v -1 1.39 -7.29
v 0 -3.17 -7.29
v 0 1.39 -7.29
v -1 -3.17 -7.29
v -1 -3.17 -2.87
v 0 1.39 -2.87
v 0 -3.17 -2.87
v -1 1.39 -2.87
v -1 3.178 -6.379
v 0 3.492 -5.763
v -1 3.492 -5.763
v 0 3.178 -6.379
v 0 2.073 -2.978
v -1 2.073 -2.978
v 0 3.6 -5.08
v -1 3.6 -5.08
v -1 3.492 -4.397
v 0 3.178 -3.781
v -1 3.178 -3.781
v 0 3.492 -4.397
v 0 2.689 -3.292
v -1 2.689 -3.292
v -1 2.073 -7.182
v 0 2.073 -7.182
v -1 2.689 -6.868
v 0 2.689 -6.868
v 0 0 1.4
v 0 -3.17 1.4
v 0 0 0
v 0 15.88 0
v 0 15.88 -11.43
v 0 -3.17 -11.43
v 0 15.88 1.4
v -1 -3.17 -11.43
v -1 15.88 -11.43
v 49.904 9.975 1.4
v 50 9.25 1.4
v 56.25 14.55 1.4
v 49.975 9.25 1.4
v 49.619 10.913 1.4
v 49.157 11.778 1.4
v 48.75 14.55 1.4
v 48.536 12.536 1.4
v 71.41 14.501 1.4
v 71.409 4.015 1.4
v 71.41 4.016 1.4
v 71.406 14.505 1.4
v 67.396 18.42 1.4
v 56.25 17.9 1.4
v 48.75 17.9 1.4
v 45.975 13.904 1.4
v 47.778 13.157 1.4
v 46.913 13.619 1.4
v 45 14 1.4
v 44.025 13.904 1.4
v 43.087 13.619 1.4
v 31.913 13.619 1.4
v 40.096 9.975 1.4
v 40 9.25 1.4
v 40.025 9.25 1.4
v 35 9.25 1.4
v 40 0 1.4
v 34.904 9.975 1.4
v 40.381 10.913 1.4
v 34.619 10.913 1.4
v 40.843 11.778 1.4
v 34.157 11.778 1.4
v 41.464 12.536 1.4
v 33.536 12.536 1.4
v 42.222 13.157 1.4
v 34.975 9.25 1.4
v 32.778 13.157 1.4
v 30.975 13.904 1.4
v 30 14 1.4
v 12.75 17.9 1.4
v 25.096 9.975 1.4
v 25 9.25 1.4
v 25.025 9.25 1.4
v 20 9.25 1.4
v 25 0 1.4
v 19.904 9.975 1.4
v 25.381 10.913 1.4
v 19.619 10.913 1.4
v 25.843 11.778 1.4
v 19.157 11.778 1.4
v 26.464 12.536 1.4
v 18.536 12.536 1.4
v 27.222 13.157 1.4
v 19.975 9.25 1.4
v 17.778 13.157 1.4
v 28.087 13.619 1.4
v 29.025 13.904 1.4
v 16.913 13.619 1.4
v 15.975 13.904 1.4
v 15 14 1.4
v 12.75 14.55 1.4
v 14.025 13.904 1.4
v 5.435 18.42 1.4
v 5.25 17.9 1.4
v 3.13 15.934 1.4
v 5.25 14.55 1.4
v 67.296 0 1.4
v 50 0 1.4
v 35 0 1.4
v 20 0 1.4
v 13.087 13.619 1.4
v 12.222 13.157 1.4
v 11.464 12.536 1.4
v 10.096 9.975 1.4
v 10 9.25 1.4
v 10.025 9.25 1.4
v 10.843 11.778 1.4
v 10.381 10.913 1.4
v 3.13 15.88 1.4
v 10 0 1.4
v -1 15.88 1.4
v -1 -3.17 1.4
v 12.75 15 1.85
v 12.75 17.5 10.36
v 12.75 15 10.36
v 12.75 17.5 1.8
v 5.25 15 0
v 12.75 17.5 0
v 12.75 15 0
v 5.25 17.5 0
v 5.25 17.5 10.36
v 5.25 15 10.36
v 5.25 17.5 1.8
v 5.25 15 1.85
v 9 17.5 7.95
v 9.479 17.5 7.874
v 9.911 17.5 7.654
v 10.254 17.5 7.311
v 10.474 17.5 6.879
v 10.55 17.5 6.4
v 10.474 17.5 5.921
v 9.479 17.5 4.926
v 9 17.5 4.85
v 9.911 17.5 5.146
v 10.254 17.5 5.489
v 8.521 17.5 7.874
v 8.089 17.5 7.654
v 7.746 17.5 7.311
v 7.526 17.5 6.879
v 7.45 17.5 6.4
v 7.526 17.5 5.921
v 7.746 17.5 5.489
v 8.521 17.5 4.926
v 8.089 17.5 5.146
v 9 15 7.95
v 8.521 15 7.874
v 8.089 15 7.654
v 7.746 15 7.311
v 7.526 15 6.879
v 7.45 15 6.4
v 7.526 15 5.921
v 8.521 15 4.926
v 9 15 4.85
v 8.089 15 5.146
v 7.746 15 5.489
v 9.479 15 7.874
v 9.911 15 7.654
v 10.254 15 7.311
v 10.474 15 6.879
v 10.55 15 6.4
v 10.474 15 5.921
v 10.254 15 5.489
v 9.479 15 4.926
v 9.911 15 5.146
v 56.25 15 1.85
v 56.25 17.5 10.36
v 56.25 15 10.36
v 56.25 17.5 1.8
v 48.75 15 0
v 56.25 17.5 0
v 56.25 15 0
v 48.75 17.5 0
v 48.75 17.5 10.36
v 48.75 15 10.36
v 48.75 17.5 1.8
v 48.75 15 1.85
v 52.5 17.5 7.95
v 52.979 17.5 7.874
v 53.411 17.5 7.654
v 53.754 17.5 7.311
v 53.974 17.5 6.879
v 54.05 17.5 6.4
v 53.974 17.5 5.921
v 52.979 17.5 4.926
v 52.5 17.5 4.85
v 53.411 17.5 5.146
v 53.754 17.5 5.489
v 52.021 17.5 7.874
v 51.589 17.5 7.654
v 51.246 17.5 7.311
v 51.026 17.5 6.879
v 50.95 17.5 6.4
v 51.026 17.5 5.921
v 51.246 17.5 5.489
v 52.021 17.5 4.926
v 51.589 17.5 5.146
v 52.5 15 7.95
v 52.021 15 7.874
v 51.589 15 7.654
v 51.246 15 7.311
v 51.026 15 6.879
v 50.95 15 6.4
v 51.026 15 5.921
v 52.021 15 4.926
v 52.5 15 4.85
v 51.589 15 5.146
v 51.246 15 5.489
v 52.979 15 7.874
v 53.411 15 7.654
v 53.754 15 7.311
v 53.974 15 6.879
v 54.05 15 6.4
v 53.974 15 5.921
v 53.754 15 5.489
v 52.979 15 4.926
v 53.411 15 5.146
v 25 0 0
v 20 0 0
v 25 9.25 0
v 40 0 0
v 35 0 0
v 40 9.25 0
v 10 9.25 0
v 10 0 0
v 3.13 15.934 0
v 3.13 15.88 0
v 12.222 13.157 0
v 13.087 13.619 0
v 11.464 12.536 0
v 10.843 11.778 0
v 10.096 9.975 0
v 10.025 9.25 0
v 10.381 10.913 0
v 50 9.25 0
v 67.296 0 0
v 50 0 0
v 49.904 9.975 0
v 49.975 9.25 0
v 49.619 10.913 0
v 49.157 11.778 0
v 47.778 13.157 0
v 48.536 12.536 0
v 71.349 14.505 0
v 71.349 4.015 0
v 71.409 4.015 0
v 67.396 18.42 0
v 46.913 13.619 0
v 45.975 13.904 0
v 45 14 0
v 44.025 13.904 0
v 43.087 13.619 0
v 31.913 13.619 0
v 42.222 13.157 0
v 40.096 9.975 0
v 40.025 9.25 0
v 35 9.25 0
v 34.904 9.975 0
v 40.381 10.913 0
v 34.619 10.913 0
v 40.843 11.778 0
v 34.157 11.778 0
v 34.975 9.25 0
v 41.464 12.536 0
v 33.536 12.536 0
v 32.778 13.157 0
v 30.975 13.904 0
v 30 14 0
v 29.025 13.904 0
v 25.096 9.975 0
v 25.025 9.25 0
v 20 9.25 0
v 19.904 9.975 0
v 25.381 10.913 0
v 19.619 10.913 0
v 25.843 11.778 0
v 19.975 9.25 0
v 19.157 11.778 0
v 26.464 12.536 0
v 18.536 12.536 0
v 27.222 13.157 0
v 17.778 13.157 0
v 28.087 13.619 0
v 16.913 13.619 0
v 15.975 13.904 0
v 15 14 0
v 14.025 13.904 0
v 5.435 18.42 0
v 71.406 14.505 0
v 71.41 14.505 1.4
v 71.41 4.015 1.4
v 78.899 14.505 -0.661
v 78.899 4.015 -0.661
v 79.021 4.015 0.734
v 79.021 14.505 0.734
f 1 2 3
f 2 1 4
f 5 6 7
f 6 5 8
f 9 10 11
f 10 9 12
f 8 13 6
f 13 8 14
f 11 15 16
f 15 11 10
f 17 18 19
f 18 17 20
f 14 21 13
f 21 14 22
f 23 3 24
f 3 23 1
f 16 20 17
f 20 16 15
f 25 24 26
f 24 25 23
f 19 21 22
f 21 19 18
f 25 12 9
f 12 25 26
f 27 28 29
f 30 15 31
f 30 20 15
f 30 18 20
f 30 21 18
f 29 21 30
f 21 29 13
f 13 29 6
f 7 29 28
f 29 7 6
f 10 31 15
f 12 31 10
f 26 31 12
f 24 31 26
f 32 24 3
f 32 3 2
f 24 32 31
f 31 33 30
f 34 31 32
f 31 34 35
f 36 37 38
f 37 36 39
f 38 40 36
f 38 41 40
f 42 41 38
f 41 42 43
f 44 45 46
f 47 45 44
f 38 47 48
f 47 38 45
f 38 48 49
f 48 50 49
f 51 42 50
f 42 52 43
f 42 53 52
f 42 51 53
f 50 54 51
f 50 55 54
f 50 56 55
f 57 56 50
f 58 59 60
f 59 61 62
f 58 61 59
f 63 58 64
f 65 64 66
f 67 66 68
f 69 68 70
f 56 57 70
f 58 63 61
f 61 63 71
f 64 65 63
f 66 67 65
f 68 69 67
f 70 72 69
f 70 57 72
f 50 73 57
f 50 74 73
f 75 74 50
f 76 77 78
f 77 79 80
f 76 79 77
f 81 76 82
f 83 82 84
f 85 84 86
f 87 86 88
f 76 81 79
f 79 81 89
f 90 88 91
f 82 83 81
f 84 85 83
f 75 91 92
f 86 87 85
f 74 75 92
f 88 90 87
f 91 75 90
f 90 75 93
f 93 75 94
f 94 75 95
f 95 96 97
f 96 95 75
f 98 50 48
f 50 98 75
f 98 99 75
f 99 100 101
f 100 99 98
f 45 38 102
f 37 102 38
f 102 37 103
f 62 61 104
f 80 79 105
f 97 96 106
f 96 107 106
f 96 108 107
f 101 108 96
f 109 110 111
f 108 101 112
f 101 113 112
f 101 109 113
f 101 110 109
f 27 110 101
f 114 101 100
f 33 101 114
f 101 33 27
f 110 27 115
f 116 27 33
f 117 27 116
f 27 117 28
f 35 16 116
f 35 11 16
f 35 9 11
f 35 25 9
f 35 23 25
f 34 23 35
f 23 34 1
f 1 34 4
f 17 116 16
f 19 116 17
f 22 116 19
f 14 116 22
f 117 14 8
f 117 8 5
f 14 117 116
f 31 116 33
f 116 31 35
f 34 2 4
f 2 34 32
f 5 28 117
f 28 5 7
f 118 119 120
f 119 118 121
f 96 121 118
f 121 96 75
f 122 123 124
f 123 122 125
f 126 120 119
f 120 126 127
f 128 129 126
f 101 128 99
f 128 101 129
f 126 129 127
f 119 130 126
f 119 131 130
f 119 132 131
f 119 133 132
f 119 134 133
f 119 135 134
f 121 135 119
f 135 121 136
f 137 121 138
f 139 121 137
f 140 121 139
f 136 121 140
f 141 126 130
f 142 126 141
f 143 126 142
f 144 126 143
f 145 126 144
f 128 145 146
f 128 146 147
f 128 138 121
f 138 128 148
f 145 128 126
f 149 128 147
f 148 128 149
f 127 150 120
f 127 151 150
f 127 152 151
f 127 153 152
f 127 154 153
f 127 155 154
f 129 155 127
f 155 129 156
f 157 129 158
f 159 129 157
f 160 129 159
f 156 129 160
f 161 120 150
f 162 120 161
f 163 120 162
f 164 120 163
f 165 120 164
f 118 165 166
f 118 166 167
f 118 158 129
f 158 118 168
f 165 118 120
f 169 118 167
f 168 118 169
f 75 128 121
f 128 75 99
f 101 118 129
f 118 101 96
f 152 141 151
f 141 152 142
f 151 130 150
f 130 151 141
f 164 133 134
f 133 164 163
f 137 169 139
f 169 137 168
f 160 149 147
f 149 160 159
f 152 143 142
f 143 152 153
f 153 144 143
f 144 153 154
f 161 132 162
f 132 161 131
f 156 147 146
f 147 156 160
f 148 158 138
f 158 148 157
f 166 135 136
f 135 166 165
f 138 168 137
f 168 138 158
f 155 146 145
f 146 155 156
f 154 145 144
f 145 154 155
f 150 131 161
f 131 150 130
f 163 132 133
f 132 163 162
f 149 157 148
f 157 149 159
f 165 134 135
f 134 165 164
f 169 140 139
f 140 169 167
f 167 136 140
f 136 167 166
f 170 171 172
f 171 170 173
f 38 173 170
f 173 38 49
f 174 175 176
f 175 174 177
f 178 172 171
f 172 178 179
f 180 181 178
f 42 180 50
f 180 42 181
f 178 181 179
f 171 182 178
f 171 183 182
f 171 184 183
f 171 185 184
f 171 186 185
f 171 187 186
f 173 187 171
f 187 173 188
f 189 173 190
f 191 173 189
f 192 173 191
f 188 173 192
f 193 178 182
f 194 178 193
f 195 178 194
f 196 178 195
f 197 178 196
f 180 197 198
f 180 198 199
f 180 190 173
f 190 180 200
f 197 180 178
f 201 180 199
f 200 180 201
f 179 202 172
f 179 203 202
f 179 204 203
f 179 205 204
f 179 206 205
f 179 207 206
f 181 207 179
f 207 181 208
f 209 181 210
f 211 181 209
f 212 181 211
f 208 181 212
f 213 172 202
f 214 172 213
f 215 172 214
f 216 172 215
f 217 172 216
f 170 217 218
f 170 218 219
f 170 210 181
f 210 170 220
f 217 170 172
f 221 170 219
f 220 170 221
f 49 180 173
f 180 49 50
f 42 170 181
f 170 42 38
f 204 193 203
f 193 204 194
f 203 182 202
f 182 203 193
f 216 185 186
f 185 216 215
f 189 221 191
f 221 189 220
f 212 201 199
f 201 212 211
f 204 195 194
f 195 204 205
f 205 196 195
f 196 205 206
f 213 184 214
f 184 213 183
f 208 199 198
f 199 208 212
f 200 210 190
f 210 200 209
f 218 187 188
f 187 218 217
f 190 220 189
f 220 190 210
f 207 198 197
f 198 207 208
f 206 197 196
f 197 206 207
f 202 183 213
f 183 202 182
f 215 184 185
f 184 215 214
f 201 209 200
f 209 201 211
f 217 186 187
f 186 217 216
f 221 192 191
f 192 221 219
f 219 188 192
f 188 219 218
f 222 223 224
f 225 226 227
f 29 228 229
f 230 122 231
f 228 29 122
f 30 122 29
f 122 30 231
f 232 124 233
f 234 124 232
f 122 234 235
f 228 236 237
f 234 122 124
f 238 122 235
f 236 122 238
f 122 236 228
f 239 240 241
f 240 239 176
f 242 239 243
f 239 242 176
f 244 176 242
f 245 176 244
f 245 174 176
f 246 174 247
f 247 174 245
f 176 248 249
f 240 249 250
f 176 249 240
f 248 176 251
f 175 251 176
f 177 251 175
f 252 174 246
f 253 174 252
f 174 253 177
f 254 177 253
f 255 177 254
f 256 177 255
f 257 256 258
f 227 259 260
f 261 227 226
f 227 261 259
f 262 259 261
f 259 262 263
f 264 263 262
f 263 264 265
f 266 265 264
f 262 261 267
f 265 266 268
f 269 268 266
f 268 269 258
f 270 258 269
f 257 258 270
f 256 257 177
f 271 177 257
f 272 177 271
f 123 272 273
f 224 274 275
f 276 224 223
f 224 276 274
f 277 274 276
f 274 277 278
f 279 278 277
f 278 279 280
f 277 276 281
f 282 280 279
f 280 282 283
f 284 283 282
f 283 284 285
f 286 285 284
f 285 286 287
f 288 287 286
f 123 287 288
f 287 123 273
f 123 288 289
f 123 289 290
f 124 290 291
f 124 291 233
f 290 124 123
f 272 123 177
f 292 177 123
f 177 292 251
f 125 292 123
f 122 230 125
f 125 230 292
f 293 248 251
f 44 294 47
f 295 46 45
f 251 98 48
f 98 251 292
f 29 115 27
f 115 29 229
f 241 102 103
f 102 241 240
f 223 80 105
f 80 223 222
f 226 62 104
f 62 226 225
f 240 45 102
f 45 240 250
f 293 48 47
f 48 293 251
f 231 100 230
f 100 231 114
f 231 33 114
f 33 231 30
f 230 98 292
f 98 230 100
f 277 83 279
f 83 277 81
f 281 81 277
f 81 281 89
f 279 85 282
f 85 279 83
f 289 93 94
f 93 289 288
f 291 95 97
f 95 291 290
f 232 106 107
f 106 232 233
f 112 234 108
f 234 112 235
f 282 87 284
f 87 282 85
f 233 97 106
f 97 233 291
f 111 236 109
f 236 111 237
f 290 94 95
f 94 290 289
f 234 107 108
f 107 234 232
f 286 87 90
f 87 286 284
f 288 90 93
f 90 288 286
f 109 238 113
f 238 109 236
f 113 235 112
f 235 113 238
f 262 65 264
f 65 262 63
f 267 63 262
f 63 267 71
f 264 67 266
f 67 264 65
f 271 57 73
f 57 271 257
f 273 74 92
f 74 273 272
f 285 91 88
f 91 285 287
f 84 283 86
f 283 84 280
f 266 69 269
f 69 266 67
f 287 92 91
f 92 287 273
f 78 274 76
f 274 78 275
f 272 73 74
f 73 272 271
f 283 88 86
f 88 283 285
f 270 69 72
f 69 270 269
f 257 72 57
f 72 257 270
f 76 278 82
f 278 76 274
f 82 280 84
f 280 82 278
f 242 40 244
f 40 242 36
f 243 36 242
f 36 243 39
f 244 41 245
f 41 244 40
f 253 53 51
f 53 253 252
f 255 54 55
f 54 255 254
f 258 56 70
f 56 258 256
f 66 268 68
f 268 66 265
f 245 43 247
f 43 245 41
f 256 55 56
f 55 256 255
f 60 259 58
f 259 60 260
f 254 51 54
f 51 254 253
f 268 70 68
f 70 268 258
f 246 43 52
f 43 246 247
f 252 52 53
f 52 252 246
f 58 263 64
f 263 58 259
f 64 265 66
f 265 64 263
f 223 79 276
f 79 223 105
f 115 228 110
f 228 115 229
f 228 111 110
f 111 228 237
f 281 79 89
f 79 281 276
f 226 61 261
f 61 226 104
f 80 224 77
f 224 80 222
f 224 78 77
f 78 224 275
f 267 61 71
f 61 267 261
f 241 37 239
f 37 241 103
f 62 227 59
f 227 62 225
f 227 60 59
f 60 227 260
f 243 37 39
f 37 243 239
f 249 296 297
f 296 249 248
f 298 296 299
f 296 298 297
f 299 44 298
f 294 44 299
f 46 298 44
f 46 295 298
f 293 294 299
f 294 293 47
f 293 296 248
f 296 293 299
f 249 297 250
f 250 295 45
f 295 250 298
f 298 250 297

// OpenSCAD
// mirror this

resolution=32; // $fn
low_profile=1; // [0:false, 1:true]
bracket_thickness = 1.4; // base bracket depth

angled_bottom_tab = 1; // [0:false, 1:true]
decorative_hole=0; // [0:false, 1:true]
isa_slot=0; // [0:false, 1:true]
pcb_thickness=1.6;
top_tab_thickness = 1;
/* [Screw mount tabs] */

first_screw_tab_enabled = 1; // [0:false, 1:true]
second_screw_tab_enabled = 1; // [0:false, 1:true]
screw_mounts_on_bottom_of_pcb = 0; // [0:false, 1:true]
screw_mount_width = 7.5;
screw_mount_depth = 2.5;
screw_mount_hole_r = 1.55; // m3 bolt
screw_mount_thread_distance_base = 5;
screw_mount_inset_r = 2.9; // m3 bolt head
screw_mount_inset_depth = 0;
screw_mount_caulking = 0.5;

first_mount_x = 9;
mount_hole_distance = 43.5;
// If on top of the PCB, it is recommended to have this be at least the thickness of the PCB
screw_mount_y = 15;
second_mount_x = first_mount_x + mount_hole_distance;

/* [Round Holes] */
hole_1_enabled = 1; // [0:false, 1:true]
// X is offset from the first screw hole (i.e. the screw hole closest to the case mount cutout)
hole_1_x = 15 - first_mount_x;
// Y is offset from top of pcb
hole_1_y = -6;
hole_1_d = 10;

hole_2_enabled = 1; // [0:false, 1:true]
hole_2_x = 30 - first_mount_x;
hole_2_y = hole_1_y;
hole_2_d = 10;

hole_3_enabled = 1; // [0:false, 1:true]
hole_3_x = 45 - first_mount_x;
hole_3_y = hole_1_y;
hole_3_d = 10;

hole_4_enabled = 0; // [0:false, 1:true]
hole_4_x = 76.12;
hole_4_y = 7;
hole_4_d = 6;

hole_5_enabled = 0; // [0:false, 1:true]
hole_5_x = 37.69;
hole_5_y = 6.5;
hole_5_d = 9.5;

hole_6_enabled = 0; // [0:false, 1:true]
hole_6_x = 51.04;
hole_6_y = 6.5;
hole_6_d = 9.5;

/* [Rectangular Holes] */
// hole is at center of x,y positions
rectangular_hole_1_enabled = 1; // [0:false, 1:true]
// X is offset from the first screw hole (i.e. the screw hole closest to the case mount cutout)
rectangular_hole_1_x = hole_1_x;
// Y is offset from top of pcb
rectangular_hole_1_y = -11;
rectangular_hole_1_w = 10.5;
rectangular_hole_1_h = 10.5;

rectangular_hole_2_enabled = 1; // [0:false, 1:true]
rectangular_hole_2_x = hole_2_x;
rectangular_hole_2_y = rectangular_hole_1_y;
rectangular_hole_2_w = 10.5;
rectangular_hole_2_h = 10.5;

rectangular_hole_3_enabled = 1; // [0:false, 1:true]
rectangular_hole_3_x = hole_3_x;
rectangular_hole_3_y = rectangular_hole_1_y;
rectangular_hole_3_w = 10.5;
rectangular_hole_3_h = 10.5;

rectangular_hole_4_enabled = 0; // [0:false, 1:true]
rectangular_hole_4_x = 76.12;
rectangular_hole_4_y = 7;
rectangular_hole_4_w = 10.5;
rectangular_hole_4_h = 10.5;

rectangular_hole_5_enabled = 0; // [0:false, 1:true]
rectangular_hole_5_x = 37.69;
rectangular_hole_5_y = 6.5;
rectangular_hole_5_w = 10.5;
rectangular_hole_5_h = 10.5;

rectangular_hole_6_enabled = 0; // [0:false, 1:true]
rectangular_hole_6_x = 51.04;
rectangular_hole_6_y = 6.5;
rectangular_hole_6_w = 10.5;
rectangular_hole_6_h = 10.5;
// values taken from https://content.norcomp.net/rohspdfs/Connectors/PanelCutOuts/Panel_Cutout_D-Sub-Single.pdf

/* [D-Sub holes (Serial/VGA/Gameport)] */
// hole is at center of x,y positions
dsub_hole_1_type = 0; // [0:None, 15.46:DB-9(VGA/Serial), 23.79:DB-15(Gameport), 37.51:DB-25(Parallel)]
// X is offset from the first screw hole (i.e. the screw hole closest to the case mount cutout)
dsub_hole_1_x = 37.6;
// Y is offset from top of pcb
dsub_hole_1_y = 7.1;
dsub_hole_1_invert = 0; // [0:false, 1:true]

dsub_hole_2_type = 0; // [0:None, 15.46:DB-9(VGA/Serial), 23.79:DB-15(Gameport), 37.51:DB-25(Parallel)]
dsub_hole_2_x = 37.6;
dsub_hole_2_y = 7.1;
dsub_hole_2_invert = 0; // [0:false, 1:true]

dsub_hole_3_type = 0; // [0:None, 15.46:DB-9(VGA/Serial), 23.79:DB-15(Gameport), 37.51:DB-25(Parallel)]
dsub_hole_3_x = 37.6;
dsub_hole_3_y = 7.1;
dsub_hole_3_invert = 0; // [0:false, 1:true]

/* [DVI Hole]] */

dvi_hole_enabled = 0; // [0:false, 1:true]
dvi_hole_x = 37.6;
dvi_hole_y = 6;
dvi_hole_invert = 0; // [0:false, 1:true]


module __Customizer_Limit__ () {}  // This actually works
shown_by_customizer = 0; // [0:false, 1:true]

$fn = resolution;
bracket_width_length = low_profile? 71.46 : 112.78;
bracket_length = low_profile ? 79.20 : 120.02;
bracket_width = 18.42 + 0;
bottom_tab_width = 10.19 + 0;
bracket_bottom_tab_angle_length = (bracket_width - bottom_tab_width) / 2;

bracket_reinforce_width = bracket_width * .2;
bracket_reinforce_length = bracket_length * .78;

bracket_hole_dia = decorative_hole ? 4.75 : 0;
bracket_hole_distance = low_profile ? 66.19 : 107.01;

screw_mount_thread_distance = screw_mount_thread_distance_base + bracket_thickness;
screw_mount_length = screw_mount_thread_distance * 1.4 + bracket_thickness;

bracket_reinforce_depth = 0;
bracket_reinforce_offset_x = -6;
bracket_reinforce_offset_y = -5;


module prism(l, w, h){
     polyhedron(
         points=[[0,0,0], [l,0,0], [l,w,0], [0,w,0], [0,w,h], [l,w,h]],
         faces=[[0,1,2,3],[5,4,3,2],[0,4,5,1],[0,3,4],[5,2,1]]
         );
}

// top notch
notch_width = 2.54;
notch_length = 3.94-.86; // 3.94 - specified thickness of .86mm (vs actual thickness)

top_tab_width = 19.05; // had to fudge this
top_tab_length = 11.43;
top_tab_x = 0;
top_tab_y = 3.17; // 21.59 - 18.42
top_tab_screw_groove_dia = 4.42;
top_tab_screw_groove_fudge = -0.4; // kinda came out looking wrong so I'm faking it a bit here
top_tab_screw_groove_center = 3.18 + top_tab_screw_groove_fudge;
top_tab_screw_groove_distance = 6.35;
top_tab_screw_groove_translate_z = top_tab_length - top_tab_screw_groove_dia / 2 - top_tab_screw_groove_distance;

top_tab_useless_notch_length = 3.05;
top_tab_useless_notch_width = top_tab_screw_groove_distance - top_tab_screw_groove_dia / 2;
top_tab_useless_notch_z = top_tab_length - top_tab_useless_notch_width;
top_tab_useless_notch_y = top_tab_useless_notch_width / 2 + 8.05 - top_tab_useless_notch_length / 2;

mirror([0, 0, 1])
translate([0, 0, -bracket_thickness])
translate([-top_tab_thickness + top_tab_x, -top_tab_y, 0]) difference() {
  cube([top_tab_thickness, top_tab_width, top_tab_length + bracket_thickness]);
  translate([-.5, -1, top_tab_screw_groove_translate_z + bracket_thickness]) {
    cube([top_tab_thickness + 1, top_tab_screw_groove_center * 2, top_tab_screw_groove_dia]);
    translate([1, top_tab_screw_groove_center * 2, top_tab_screw_groove_dia / 2])
      rotate([0, 90, 0])
      cylinder(r=top_tab_screw_groove_dia / 2, h=top_tab_thickness * 2, $fn=20, center=true);
  }
  //translate([-.5, top_tab_useless_notch_y, top_tab_useless_notch_z + bracket_thickness]) {
  //  cube([top_tab_thickness + 1, top_tab_useless_notch_length, top_tab_useless_notch_width + 1]);
  //}
}

// screw mounts
module screwmount(x) {

  translate([0, isa_slot? -screw_mount_y - screw_mount_depth : -bracket_width + screw_mount_y, 0]) // easier to be explicit here than factor it in the below statement
  translate([x - screw_mount_width / 2, bracket_width, -screw_mount_length + bracket_thickness])
    // cut out the threads
    difference() {
      union() {
        cube([screw_mount_width, screw_mount_depth, screw_mount_length]);
        //top caulking
        if ((isa_slot && bracket_width-screw_mount_y +screw_mount_caulking < bracket_width) || (!isa_slot &&  screw_mount_y + screw_mount_depth+ screw_mount_caulking < bracket_width)){
        difference(){
        translate([screw_mount_width, screw_mount_depth-.05, screw_mount_length-bracket_thickness-screw_mount_caulking +.05])
          rotate([90,0,180])
          prism(screw_mount_width,screw_mount_caulking+.05,screw_mount_caulking+.05);
        }
        }
        //bottom caulking
        if ((isa_slot && bracket_width-screw_mount_y -screw_mount_depth -screw_mount_caulking > 0) || (!isa_slot && screw_mount_y - screw_mount_caulking > 0)){
        translate([0, 0, screw_mount_length-bracket_thickness-screw_mount_caulking +.05])
          rotate([90,0,0])
          prism(screw_mount_width,screw_mount_caulking+.05,screw_mount_caulking+.05);
        }
      }
       translate([screw_mount_width / 2, -2, screw_mount_length - screw_mount_thread_distance])
         rotate([0, 90, 90]) cylinder(r=screw_mount_hole_r, h=10, $fn=20);
      //inset
      translate([screw_mount_width / 2, ((isa_slot && screw_mounts_on_bottom_of_pcb) || (!isa_slot && !screw_mounts_on_bottom_of_pcb))?(screw_mount_depth - screw_mount_inset_depth + 0.01):(-0.01),
        screw_mount_length - screw_mount_thread_distance])
          rotate([0, 90, 90])
          cylinder(r=screw_mount_inset_r, h=screw_mount_inset_depth, $fn=20);
    }
}

mirror([0, 0, 1])
translate([0, 0, -bracket_thickness]) {
if (first_screw_tab_enabled){
  screwmount(first_mount_x);
}
if (second_screw_tab_enabled) {
  screwmount(second_mount_x);
}
}

// bottom notch
shiftover_width = top_tab_y;
shiftover_length = 2.92;


// build up the shiftover
//translate([0, -shiftover_width, 0]) cube([shiftover_length, shiftover_width + .1, bracket_thickness]);
//translate([
//  shiftover_length,
//  -shiftover_width,
//  bracket_thickness])
//  rotate([0, 90, 0])
//  prism(bracket_thickness, shiftover_width, shiftover_width);

module translate_hole(hole_x,hole_y){
  y_offset_b = screw_mounts_on_bottom_of_pcb ? pcb_thickness + screw_mount_depth : 0;
  y_offset = !isa_slot ?
    hole_y + screw_mount_y + y_offset_b
    : bracket_width - (hole_y + screw_mount_y + y_offset_b);
  translate([first_mount_x+ hole_x, y_offset, -bracket_thickness])
    children();
}
module round_hole(hole_x,hole_y,hole_d){
  translate_hole(hole_x,hole_y)
    cylinder(10,hole_d/2,hole_d/2);
}
module rectangular_hole(hole_x,hole_y,hole_w,hole_h){
  translate_hole(hole_x,hole_y)
    cube([10, hole_w, hole_h], center=true);
}

module dsub_hole(hole_x,hole_y,c_sz, invert = false){
  translate_hole(hole_x,hole_y)
    dsub_cutout(c_sz, invert);
}
module dsub_cutout(c_sz, invert=false){
  $fn=64;
  rotate([0,0,90]){
    top_x_coord = !invert ? c_sz/2 : (c_sz-2)/2;
    bottom_x_coord = !invert ? (c_sz-2)/2 : c_sz/2;
    hole_coord = (c_sz+9.53)/2;
    y_distance = 5.66;
    y_coord = y_distance/2;
    translate([0,hole_coord,0])
        cylinder(r=1.55,h=10);
    translate([0,-hole_coord,0])
        cylinder(r=1.55,h=10);
    hull(){
      translate([y_coord,-top_x_coord,0]){
      cylinder(r=2.51,h=10);
      }
      translate([y_coord,top_x_coord,0]){
      cylinder(r=2.51,h=10);
      }
      translate([-y_coord,-bottom_x_coord,0]){
      cylinder(r=2.51,h=10);
      }
      translate([-y_coord,bottom_x_coord,0]){
      cylinder(r=2.51,h=10);
      }
    }
  }
}
module dvi_hole(hole_x,hole_y, invert = false){
  translate_hole(hole_x,hole_y)
    dvi_cutout(invert);
}
module dvi_cutout(invert=false){
  $fn=64;
  rotate([0,0,90]){
    a_sz = 26.1;
    top_r_sz = 1.2;
    bottom_r_sz = 3;
    c_sz = a_sz - (top_r_sz *2);
    e_sz = c_sz - ((bottom_r_sz - top_r_sz) * 2);
    hole_coord = 32.5 /2;
    y_distance = 9.6 - (top_r_sz+ bottom_r_sz);

    top_x_coord = !invert ? c_sz/2 : e_sz/2;
    bottom_x_coord = !invert ? e_sz/2 : c_sz/2;
    top_r = !invert ? top_r_sz : bottom_r_sz;
    bottom_r = !invert ? bottom_r_sz: top_r_sz ;

    y_coord = y_distance/2;

    translate([0,hole_coord,0])
        cylinder(r=1.6,h=10);
    translate([0,-hole_coord,0])
        cylinder(r=1.6,h=10);
    hull(){
      translate([y_coord,-top_x_coord,0]){
      cylinder(r=top_r,h=10);
      }
      translate([y_coord,top_x_coord,0]){
      cylinder(r=top_r,h=10);
      }
      translate([-y_coord,-bottom_x_coord,0]){
      cylinder(r=bottom_r,h=10);
      }
      translate([-y_coord,bottom_x_coord,0]){
      cylinder(r=bottom_r,h=10);
      }
    }
  }
}
// Main bracket part
mirror([0, 0, 1])
translate([0, 0, -bracket_thickness]) {
difference() {
  // the base bracket
  cube([bracket_length, bracket_width, bracket_thickness]);

  // carve out the angles
  translate([
    bracket_width_length,
    bracket_bottom_tab_angle_length - .05,
    2])
    rotate([0, 90, 0])
    rotate([180, 0, 0])
    prism(bracket_bottom_tab_angle_length, bracket_bottom_tab_angle_length, bracket_bottom_tab_angle_length + 0.1);
  // other side
  translate([
    bracket_width_length + 0.1,
    bracket_bottom_tab_angle_length + bottom_tab_width + .05,
    -2])
    rotate([0, 90, 0])
    rotate([180, 0, 180])
    prism(bracket_bottom_tab_angle_length, bracket_bottom_tab_angle_length, bracket_bottom_tab_angle_length + 0.1);

  // ornamental hole
  translate([bracket_hole_distance, bracket_width / 2, -1.5])
    cylinder(r=bracket_hole_dia / 2, h=3, $fn=20);

  // notch out the shiftover
  translate([-0.95, bracket_width - notch_width, -1])
    cube([notch_length + 1, notch_width + .1, bracket_thickness + 2]);
  translate([
    notch_length,
    bracket_width - notch_width,
    2])
    rotate([0, 90, 0])
    prism(notch_width, notch_width + .2, notch_width);
  // shape the tab at the bottom
  if (angled_bottom_tab){
    translate([bracket_width_length - 0.05, -.05, -.5])
      cube([bracket_length - bracket_width_length + 0.1, bottom_tab_width+ bracket_bottom_tab_angle_length * 2 + .1, bracket_thickness + 1.05]);
  } else {
    translate([bracket_width_length - 0.05, -.05, -.5])
      cube([bracket_length - bracket_width_length + 0.1, bracket_bottom_tab_angle_length + .1, bracket_thickness + 1.05]);
    translate([bracket_width_length - 0.05, bracket_bottom_tab_angle_length + bottom_tab_width,-.5])
      cube([bracket_length - bracket_width_length + 0.1, bracket_bottom_tab_angle_length + 0.1, bracket_thickness + 1]);

  }

  y_offset_b = screw_mounts_on_bottom_of_pcb ? pcb_thickness + screw_mount_depth : 0;
  // holes

  //round holes
  if (hole_1_enabled){
    round_hole(hole_1_x,hole_1_y,hole_1_d);
  }
  if (hole_2_enabled){
    round_hole(hole_2_x,hole_2_y,hole_2_d);
  }
  if (hole_3_enabled){
    round_hole(hole_3_x,hole_3_y,hole_3_d);
  }
  if (hole_4_enabled){
    round_hole(hole_4_x,hole_4_y,hole_4_d);
  }
  if (hole_5_enabled){
    round_hole(hole_5_x,hole_5_y,hole_5_d);
  }
  if (hole_6_enabled){
    round_hole(hole_6_x,hole_6_y,hole_6_d);
  }
  //rectangular holes
  if (rectangular_hole_1_enabled){
    rectangular_hole(rectangular_hole_1_x,rectangular_hole_1_y,rectangular_hole_1_w, rectangular_hole_1_h);
  }
  if (rectangular_hole_2_enabled){
    rectangular_hole(rectangular_hole_2_x,rectangular_hole_2_y,rectangular_hole_2_w, rectangular_hole_2_h);
  }
  if (rectangular_hole_3_enabled){
    rectangular_hole(rectangular_hole_3_x,rectangular_hole_3_y,rectangular_hole_3_w, rectangular_hole_3_h);
  }
  if (rectangular_hole_4_enabled){
    rectangular_hole(rectangular_hole_4_x,rectangular_hole_4_y,rectangular_hole_4_w, rectangular_hole_4_h);
  }
  if (rectangular_hole_5_enabled){
    rectangular_hole(rectangular_hole_5_x,rectangular_hole_5_y,rectangular_hole_5_w, rectangular_hole_5_h);
  }
  if (rectangular_hole_6_enabled){
    rectangular_hole(rectangular_hole_6_x,rectangular_hole_6_y,rectangular_hole_6_w, rectangular_hole_6_h);
  }
  if (dsub_hole_1_type > 0){
    dsub_hole(dsub_hole_1_x, dsub_hole_1_y, dsub_hole_1_type, dsub_hole_1_invert);
  }
  if (dsub_hole_2_type > 0){
    dsub_hole(dsub_hole_2_x, dsub_hole_2_y, dsub_hole_2_type, dsub_hole_2_invert);
  }
  if (dsub_hole_3_type > 0){
    dsub_hole(dsub_hole_3_x, dsub_hole_3_y, dsub_hole_3_type, dsub_hole_3_invert);
  }
  if (dvi_hole_enabled){
    dvi_hole(dvi_hole_x, dvi_hole_y, dvi_hole_invert);
  }
}

if (angled_bottom_tab){
  difference(){
    translate([bracket_width_length-0.05, bracket_bottom_tab_angle_length-0.1,0])
    rotate([0,-5,0])
    translate([-0.2,0,0])
    cube([bracket_length - bracket_width_length + 0.1, bottom_tab_width+.3, bracket_thickness ]);

    translate([bracket_width_length-0.3, bracket_bottom_tab_angle_length-0.2,-bracket_thickness])
    cube([bracket_length - bracket_width_length, bottom_tab_width+.4,1.4]);
  }
}
}

// reinforce bracket body

//translate([
//  bracket_length / 2 - bracket_reinforce_length / 2 + bracket_reinforce_offset_x,
//  (isa_slot? (bracket_width  - bracket_width / 2 - bracket_reinforce_width / 2 + bracket_reinforce_offset_y) : bracket_width+bracket_reinforce_offset_y),
//  -bracket_reinforce_depth])
//  cube([bracket_reinforce_length, bracket_reinforce_width, bracket_reinforce_depth]);
////if (cf_slot_enabled) {
////  translate([
////    bracket_length / 2 - bracket_reinforce_length / 2 + bracket_reinforce_offset_x,
////    bracket_width - bracket_reinforce_width,
////    -cf_reinforce_screwmount_depth])
////    cube([bracket_reinforce_length, bracket_reinforce_width, cf_reinforce_screwmount_depth]);
////}
//
